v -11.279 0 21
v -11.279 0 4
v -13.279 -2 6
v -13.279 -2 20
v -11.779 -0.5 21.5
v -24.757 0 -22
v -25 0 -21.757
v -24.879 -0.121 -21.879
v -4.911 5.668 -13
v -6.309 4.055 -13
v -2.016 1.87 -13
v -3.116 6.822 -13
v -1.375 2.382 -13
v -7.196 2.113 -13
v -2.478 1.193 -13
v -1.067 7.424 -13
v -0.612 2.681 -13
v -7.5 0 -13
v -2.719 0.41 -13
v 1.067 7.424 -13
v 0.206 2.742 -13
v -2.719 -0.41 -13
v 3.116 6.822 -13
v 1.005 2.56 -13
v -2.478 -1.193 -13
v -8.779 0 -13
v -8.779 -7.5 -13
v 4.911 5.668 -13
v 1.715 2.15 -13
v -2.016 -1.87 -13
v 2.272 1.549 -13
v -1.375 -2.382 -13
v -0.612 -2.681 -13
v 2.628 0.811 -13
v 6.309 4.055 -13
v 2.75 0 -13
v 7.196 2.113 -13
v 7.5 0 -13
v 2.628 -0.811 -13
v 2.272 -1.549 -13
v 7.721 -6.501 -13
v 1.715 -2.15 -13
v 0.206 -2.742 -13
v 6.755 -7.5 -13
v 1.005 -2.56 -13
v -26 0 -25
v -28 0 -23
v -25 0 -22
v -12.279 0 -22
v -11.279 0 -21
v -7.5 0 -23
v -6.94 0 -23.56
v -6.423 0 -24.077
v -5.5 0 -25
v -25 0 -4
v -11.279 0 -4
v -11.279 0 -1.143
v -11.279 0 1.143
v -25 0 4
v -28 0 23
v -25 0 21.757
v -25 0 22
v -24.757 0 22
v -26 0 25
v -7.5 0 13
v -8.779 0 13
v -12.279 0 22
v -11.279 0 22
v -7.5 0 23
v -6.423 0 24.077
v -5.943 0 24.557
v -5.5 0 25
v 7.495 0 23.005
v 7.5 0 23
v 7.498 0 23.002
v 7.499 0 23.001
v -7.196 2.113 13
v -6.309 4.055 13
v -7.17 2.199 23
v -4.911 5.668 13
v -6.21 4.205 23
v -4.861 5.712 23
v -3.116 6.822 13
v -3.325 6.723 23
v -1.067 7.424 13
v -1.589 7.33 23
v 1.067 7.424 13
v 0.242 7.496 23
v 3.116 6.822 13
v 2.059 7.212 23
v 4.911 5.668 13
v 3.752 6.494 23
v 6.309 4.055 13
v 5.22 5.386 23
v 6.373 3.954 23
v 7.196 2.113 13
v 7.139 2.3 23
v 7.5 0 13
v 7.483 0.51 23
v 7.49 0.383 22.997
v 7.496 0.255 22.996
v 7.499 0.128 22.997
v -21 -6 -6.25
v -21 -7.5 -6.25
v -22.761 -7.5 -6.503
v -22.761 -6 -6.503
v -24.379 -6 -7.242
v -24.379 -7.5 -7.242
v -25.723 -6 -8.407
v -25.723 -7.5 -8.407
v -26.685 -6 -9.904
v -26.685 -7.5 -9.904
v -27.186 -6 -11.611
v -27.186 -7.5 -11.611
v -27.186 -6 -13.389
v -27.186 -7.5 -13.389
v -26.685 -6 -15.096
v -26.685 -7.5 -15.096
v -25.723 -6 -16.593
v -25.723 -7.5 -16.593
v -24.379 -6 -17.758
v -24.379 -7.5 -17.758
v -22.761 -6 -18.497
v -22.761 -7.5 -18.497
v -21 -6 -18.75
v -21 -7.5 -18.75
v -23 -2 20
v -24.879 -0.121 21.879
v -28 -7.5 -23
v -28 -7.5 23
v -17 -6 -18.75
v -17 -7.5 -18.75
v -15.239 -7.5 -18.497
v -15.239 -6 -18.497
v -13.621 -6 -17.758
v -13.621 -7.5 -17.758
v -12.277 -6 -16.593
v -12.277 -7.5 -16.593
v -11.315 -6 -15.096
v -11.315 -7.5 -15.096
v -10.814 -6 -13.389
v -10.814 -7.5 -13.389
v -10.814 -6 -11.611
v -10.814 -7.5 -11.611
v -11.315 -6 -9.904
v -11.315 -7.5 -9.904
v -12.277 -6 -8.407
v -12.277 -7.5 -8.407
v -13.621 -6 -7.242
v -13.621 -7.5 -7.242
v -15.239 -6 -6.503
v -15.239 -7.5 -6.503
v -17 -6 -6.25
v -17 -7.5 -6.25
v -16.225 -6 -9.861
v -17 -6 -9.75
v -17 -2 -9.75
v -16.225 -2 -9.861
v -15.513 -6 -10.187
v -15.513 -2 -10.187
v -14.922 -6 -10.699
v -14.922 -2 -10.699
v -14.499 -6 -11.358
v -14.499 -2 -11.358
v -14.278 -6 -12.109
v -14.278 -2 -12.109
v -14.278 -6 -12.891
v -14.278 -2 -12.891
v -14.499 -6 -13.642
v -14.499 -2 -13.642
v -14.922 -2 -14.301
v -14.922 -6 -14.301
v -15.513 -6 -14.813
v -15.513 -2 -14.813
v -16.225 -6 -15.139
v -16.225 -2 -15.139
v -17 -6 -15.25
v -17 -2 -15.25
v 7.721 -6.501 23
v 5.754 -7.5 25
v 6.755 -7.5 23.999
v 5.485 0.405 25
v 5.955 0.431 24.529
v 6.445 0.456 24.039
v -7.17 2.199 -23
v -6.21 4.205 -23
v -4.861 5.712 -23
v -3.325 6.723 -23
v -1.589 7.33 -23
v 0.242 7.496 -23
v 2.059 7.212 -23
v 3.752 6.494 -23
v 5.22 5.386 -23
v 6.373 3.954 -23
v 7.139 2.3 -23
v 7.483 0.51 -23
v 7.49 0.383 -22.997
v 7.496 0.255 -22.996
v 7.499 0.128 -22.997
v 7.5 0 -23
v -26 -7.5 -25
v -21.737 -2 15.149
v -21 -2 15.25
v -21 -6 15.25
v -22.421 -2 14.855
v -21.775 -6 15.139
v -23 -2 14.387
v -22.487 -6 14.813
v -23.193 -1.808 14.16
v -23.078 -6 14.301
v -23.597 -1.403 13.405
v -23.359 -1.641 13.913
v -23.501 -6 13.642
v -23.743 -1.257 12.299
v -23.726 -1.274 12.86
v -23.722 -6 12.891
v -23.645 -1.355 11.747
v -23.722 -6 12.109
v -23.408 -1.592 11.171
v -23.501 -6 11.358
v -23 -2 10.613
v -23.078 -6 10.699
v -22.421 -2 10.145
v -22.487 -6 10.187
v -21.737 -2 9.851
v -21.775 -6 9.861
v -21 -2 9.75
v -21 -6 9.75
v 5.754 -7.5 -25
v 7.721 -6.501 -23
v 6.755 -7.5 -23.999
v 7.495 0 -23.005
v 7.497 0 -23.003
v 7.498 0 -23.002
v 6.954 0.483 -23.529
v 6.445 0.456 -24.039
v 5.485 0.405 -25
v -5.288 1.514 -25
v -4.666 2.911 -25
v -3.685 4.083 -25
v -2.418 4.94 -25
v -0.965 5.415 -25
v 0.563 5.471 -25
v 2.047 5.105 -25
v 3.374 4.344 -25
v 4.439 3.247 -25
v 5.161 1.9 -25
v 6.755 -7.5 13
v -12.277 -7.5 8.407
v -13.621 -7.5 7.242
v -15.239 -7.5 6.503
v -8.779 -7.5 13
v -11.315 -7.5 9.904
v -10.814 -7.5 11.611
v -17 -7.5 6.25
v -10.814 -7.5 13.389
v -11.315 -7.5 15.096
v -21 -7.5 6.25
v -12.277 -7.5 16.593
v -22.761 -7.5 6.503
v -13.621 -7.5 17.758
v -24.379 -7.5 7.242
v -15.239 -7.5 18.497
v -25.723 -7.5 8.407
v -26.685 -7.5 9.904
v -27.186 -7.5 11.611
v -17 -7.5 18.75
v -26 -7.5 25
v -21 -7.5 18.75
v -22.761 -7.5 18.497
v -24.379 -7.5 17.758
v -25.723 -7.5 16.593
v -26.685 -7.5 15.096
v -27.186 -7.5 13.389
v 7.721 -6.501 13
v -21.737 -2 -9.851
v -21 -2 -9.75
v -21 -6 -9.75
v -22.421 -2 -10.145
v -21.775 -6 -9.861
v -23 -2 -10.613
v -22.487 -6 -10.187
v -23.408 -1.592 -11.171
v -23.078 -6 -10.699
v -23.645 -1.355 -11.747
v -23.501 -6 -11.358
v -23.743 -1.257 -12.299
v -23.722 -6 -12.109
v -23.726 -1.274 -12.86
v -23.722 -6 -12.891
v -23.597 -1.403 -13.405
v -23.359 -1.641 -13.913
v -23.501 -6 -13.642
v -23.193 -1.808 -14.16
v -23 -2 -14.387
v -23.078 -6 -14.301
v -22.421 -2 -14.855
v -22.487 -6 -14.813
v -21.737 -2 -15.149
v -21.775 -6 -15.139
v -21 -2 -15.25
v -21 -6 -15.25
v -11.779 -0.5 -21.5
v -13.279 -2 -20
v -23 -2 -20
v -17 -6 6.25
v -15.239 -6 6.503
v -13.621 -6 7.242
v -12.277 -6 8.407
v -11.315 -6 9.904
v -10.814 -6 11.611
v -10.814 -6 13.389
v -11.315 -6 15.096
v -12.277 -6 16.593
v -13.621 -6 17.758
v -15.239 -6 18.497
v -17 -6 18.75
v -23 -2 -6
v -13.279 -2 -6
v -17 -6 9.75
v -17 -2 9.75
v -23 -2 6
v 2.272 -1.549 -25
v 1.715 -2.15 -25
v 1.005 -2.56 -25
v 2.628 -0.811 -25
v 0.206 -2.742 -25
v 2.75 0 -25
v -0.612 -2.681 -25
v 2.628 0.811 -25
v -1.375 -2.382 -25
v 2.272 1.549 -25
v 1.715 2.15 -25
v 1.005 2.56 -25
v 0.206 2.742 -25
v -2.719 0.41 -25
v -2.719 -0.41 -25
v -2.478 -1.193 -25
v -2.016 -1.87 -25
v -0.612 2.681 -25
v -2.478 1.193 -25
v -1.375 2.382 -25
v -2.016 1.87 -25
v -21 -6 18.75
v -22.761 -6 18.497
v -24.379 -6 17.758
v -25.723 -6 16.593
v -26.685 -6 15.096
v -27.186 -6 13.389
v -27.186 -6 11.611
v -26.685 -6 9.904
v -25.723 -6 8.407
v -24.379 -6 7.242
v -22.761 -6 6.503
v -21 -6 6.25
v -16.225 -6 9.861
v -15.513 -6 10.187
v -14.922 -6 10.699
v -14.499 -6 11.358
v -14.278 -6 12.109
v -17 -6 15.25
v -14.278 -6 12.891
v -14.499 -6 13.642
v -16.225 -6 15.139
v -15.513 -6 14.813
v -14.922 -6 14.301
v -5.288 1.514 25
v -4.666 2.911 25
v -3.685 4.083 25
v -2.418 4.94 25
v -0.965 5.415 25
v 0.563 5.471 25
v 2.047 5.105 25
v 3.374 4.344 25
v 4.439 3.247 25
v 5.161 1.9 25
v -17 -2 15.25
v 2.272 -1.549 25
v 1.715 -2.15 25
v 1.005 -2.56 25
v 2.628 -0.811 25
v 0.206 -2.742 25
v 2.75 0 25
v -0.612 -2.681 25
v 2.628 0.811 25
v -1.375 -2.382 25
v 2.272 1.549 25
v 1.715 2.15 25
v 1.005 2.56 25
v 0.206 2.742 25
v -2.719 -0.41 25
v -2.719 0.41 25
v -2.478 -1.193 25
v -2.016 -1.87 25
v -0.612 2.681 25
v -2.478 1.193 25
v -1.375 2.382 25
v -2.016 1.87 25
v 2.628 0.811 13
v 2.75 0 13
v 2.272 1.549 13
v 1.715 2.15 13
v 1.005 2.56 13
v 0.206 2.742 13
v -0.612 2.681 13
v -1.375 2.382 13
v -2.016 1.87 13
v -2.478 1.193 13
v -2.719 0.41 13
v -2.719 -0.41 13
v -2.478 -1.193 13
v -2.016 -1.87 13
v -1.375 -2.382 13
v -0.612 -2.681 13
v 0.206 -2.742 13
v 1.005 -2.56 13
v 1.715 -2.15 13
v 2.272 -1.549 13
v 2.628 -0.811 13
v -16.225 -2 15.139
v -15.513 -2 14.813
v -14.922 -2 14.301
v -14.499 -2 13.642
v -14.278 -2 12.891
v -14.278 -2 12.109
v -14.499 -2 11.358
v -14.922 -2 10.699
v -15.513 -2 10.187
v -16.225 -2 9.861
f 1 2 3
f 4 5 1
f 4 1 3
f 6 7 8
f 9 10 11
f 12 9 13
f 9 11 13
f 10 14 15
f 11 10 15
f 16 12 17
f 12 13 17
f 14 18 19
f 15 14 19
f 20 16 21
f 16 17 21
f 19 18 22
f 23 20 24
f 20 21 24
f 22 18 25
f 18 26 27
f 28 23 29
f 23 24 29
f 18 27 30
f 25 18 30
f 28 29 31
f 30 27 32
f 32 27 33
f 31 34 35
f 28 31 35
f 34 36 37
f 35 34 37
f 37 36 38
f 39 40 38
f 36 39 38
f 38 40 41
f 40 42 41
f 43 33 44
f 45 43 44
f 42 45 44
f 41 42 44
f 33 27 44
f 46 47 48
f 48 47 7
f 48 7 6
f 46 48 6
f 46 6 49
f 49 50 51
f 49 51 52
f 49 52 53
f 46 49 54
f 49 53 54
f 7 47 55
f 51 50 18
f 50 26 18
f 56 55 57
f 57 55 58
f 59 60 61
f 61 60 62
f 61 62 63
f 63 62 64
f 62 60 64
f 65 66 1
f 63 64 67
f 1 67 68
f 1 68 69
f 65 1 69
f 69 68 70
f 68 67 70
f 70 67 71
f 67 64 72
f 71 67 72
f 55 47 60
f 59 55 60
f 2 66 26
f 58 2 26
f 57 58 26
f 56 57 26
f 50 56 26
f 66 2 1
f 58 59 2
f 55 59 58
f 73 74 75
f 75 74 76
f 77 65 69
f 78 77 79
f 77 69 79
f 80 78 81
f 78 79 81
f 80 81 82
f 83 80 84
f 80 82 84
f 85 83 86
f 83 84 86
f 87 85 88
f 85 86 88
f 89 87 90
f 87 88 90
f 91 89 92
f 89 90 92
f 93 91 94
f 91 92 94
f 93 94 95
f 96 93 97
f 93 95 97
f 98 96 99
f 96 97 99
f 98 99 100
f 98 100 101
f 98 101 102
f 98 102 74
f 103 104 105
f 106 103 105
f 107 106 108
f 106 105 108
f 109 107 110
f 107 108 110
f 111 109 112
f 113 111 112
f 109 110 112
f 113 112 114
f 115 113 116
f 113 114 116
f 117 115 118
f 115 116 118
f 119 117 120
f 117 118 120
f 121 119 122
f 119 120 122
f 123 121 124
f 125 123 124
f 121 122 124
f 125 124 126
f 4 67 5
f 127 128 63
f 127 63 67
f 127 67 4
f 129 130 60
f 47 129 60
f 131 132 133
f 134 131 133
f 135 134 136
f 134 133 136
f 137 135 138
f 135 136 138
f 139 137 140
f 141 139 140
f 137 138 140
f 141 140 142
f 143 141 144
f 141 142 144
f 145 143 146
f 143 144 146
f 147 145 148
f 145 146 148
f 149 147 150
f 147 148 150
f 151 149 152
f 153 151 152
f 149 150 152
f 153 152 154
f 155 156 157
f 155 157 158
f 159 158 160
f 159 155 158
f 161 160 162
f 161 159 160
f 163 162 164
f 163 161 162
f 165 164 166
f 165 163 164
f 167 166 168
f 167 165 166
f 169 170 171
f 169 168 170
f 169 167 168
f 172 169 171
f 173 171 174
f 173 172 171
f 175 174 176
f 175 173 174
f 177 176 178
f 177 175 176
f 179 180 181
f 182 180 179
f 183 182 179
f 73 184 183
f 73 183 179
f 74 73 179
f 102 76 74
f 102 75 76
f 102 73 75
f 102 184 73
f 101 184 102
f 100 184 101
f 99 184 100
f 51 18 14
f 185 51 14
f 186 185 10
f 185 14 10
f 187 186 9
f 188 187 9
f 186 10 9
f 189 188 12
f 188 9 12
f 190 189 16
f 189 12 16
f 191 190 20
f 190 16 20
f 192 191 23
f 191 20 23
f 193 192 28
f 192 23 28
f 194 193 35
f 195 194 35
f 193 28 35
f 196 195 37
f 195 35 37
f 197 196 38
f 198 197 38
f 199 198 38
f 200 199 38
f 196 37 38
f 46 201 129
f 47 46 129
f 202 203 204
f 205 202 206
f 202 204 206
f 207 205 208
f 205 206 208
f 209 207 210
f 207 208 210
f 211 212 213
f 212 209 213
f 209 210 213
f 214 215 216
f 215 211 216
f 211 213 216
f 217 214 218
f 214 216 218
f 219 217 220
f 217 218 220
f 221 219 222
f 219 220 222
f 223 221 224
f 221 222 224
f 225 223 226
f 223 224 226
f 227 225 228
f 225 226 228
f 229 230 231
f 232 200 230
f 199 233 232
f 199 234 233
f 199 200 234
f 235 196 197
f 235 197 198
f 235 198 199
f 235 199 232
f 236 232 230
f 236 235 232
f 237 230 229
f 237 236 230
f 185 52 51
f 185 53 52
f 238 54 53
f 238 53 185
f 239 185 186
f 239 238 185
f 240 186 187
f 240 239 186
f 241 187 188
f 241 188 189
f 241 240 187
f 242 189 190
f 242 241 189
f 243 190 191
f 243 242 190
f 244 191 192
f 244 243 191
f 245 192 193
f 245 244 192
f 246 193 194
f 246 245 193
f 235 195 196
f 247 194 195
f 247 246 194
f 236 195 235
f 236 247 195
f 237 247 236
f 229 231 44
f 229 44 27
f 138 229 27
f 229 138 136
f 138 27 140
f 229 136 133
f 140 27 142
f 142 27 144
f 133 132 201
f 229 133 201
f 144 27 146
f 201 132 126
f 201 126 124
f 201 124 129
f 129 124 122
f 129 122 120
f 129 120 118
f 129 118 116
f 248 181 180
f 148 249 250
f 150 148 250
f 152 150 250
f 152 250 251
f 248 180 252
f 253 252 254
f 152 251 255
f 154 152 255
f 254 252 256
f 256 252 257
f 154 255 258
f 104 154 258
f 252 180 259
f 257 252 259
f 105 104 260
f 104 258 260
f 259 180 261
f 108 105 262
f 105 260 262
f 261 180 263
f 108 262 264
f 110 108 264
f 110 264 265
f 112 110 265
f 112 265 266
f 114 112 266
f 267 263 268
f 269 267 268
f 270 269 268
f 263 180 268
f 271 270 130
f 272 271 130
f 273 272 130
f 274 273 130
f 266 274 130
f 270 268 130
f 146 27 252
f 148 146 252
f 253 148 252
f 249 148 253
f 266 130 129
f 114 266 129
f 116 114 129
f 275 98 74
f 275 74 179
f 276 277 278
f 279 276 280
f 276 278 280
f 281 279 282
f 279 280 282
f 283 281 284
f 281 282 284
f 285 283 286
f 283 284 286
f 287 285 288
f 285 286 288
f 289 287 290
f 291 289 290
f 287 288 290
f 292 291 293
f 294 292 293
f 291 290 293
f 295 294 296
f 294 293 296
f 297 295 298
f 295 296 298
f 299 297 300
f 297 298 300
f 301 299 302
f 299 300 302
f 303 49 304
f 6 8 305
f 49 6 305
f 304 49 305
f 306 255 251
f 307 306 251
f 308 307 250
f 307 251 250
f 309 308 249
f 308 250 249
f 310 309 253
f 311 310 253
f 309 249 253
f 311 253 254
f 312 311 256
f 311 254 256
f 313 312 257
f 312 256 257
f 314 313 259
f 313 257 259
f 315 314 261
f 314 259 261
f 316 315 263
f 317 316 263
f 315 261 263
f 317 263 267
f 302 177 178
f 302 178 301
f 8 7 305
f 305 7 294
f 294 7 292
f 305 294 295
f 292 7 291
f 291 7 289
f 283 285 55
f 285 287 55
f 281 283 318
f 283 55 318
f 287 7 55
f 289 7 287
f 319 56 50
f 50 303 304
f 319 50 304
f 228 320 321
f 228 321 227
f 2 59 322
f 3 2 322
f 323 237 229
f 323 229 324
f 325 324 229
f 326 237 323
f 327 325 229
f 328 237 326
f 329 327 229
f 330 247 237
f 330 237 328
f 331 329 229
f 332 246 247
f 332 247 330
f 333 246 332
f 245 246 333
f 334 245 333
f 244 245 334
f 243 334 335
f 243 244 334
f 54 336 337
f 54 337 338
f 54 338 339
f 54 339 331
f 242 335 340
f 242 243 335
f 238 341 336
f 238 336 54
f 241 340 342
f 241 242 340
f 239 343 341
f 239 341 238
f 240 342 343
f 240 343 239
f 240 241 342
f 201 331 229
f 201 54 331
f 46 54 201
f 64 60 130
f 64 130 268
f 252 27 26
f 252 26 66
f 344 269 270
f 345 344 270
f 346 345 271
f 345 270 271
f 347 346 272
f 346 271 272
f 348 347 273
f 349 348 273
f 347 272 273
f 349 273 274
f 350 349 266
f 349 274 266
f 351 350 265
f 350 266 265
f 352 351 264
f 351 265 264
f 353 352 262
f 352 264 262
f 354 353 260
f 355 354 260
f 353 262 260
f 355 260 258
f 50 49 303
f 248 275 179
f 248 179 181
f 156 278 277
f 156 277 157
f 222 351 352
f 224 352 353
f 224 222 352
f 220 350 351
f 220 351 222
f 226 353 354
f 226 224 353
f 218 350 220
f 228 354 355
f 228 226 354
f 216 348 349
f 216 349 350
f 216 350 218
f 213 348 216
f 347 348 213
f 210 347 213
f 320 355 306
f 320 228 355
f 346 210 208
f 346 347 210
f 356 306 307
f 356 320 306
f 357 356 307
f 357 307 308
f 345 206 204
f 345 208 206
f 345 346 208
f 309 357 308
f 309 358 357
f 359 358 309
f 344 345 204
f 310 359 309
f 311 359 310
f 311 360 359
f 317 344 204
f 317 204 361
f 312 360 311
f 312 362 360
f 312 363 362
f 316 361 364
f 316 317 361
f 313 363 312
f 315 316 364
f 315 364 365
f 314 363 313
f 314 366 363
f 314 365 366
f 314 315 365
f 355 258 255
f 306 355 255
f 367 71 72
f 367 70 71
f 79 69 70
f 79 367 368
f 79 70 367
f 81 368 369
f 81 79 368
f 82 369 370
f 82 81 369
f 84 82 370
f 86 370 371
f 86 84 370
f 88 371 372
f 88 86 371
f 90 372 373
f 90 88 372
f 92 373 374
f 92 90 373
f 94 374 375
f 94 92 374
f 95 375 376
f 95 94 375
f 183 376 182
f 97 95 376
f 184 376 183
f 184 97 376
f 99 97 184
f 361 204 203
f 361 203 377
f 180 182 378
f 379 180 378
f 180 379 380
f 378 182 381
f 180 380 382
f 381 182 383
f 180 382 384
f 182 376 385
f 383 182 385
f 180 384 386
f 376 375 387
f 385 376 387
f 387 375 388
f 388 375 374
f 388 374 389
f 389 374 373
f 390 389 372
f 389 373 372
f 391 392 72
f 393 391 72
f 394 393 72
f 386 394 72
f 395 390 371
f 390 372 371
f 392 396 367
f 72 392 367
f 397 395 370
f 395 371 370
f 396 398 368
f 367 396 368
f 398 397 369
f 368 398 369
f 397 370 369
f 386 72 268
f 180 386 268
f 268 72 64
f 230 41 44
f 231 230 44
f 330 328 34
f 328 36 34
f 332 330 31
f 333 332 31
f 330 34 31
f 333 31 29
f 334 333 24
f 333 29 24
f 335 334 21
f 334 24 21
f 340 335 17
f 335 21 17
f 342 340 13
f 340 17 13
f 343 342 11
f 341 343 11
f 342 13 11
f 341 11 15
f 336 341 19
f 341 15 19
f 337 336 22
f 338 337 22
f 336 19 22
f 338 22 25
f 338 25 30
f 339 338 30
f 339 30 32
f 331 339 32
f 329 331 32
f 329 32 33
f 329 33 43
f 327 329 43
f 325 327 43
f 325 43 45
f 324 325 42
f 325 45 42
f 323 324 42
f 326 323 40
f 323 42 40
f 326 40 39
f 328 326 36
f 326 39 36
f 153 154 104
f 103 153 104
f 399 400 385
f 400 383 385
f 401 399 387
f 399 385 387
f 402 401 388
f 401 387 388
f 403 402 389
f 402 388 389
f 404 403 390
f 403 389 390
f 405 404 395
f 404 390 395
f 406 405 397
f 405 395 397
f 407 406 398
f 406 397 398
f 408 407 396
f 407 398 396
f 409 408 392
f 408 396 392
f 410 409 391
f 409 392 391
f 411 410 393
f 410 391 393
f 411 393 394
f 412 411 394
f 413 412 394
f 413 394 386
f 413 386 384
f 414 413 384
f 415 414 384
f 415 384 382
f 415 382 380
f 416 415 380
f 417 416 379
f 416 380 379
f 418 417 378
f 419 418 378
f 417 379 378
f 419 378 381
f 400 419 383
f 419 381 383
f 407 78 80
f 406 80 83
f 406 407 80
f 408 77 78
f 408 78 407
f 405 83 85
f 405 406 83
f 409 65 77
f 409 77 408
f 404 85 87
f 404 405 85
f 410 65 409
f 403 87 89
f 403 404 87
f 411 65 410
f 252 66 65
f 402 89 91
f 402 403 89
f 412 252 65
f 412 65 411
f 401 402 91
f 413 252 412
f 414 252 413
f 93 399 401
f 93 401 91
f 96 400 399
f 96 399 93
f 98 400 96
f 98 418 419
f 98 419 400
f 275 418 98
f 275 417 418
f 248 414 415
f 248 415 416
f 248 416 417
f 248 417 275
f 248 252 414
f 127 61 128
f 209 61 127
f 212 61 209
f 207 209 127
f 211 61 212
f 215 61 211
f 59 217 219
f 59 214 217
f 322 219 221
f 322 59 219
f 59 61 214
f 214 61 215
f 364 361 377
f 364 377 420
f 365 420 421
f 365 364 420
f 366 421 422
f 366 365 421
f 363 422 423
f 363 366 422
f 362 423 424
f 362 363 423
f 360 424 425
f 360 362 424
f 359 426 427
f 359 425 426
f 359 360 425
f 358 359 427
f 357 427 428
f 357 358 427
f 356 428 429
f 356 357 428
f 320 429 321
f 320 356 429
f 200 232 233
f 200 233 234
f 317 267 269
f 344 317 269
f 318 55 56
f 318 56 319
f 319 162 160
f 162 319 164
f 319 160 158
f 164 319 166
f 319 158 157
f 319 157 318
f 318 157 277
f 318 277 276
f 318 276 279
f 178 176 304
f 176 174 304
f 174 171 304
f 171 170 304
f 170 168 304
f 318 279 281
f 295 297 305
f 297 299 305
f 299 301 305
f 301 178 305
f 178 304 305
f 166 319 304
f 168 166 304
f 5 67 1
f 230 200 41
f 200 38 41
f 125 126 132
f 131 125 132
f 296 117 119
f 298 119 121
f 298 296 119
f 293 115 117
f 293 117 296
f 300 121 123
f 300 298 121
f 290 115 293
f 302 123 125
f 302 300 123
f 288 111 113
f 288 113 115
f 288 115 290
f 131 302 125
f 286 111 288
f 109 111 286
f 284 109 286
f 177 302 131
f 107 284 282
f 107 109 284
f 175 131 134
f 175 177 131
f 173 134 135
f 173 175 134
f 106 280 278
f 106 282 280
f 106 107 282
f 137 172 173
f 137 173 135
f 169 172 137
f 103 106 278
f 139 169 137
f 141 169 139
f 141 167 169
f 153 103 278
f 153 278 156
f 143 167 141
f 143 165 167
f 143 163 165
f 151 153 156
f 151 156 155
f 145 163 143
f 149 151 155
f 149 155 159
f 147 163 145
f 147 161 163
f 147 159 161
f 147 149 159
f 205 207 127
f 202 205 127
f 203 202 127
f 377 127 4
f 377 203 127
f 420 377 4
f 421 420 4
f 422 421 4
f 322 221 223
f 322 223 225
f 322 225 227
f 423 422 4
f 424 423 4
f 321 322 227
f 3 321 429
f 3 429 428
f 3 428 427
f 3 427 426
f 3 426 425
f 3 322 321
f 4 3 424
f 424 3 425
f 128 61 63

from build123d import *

# Parameters (mm, degrees)
BOSS_EXTRUDE1_DEPTH = 25
MOUNT_HOLES_DEPTH   = 41.422765863
SKETCH7_W           = 16.5
SKETCH7_H           = 26
CUT_PART_DEPTH      = 20
AXIS_R              = 2.75
CUT_EXTRUDE3_DEPTH  = 30
CUT_EXTRUDE4_DEPTH  = 1.5
CUT_EXTRUDE5_DEPTH  = 2
CHAMFER2_SIZE       = 2


with BuildPart() as part:
    # contour → Boss-Extrude1 (new, symmetric)
    with BuildSketch(Plane.XY):
        with BuildLine():
            Line((7.5, 0), (7.721344931, -6.500579199))
            Line((7.721344931, -6.500579199), (6.755375242, -7.5))
            Line((6.755375242, -7.5), (0, -7.5))
            Line((0, -7.5), (-28, -7.5))
            Line((-28, -7.5), (-28, -7.827e-05))
            Line((-28, -7.827e-05), (-7.5, -7.827e-05))
            ThreePointArc((-7.5, -7.827e-05), (-3.9135e-05, 7.5), (7.5, 0))
        make_face()
    extrude(amount=BOSS_EXTRUDE1_DEPTH, both=True)

    # Sketch6 → mount-holes (cut, through all)
    with BuildSketch(Plane.XZ.offset(7.5)):
        with BuildLine():
            Line((-21, 15.25), (-17, 15.25))
            ThreePointArc((-17, 15.25), (-14.25, 12.5), (-17, 9.75))
            Line((-17, 9.75), (-21, 9.75))
            ThreePointArc((-21, 9.75), (-23.75, 12.5), (-21, 15.25))
        make_face()
        with BuildLine():
            Line((-21, -9.75), (-17, -9.75))
            ThreePointArc((-17, -9.75), (-14.25, -12.5), (-17, -15.25))
            Line((-17, -15.25), (-21, -15.25))
            ThreePointArc((-21, -15.25), (-23.75, -12.5), (-21, -9.75))
        make_face()
    extrude(amount=-MOUNT_HOLES_DEPTH, mode=Mode.SUBTRACT)

    # Sketch7 → cut-part (cut)
    with BuildSketch(Plane.XZ.offset(7.5)):
        with Locations((-0.528655069, 0)):
            Rectangle(SKETCH7_W, SKETCH7_H)
    extrude(amount=-CUT_PART_DEPTH, mode=Mode.SUBTRACT)

    # axis → Cut-Extrude3 (cut, symmetric)
    with BuildSketch(Plane.XY):
        Circle(AXIS_R)
    extrude(amount=CUT_EXTRUDE3_DEPTH, both=True, mode=Mode.SUBTRACT)

    # Sketch9 → Cut-Extrude4 (cut)
    with BuildSketch(Plane.XZ.offset(7.5)):
        with BuildLine():
            Line((-17, 18.75), (-21, 18.75))
            ThreePointArc((-21, 18.75), (-27.25, 12.5), (-21, 6.25))
            Line((-21, 6.25), (-17, 6.25))
            ThreePointArc((-17, 6.25), (-10.75, 12.5), (-17, 18.75))
        make_face()
        with BuildLine():
            Line((-21, -18.75), (-17, -18.75))
            ThreePointArc((-17, -18.75), (-10.75, -12.5), (-17, -6.25))
            Line((-17, -6.25), (-21, -6.25))
            ThreePointArc((-21, -6.25), (-27.25, -12.5), (-21, -18.75))
        make_face()
    extrude(amount=-CUT_EXTRUDE4_DEPTH, mode=Mode.SUBTRACT)

    # Chamfer1
    # the kernel refuses this chamfer: 2 mm, written as the material it takes off along each edge
    with BuildSketch(Plane(origin=(7.324969659, 5.140386945, -25), x_dir=(0.027479951033163995, 0.0009356932186842305, 0.9996219169112968), z_dir=(0.03403031050568426, -0.9994208012478462, 0))) as chamfer1_piece_1_section:
        with BuildLine():
            Line((2.05734639, 0), (-0.11309431, 2.054235587))
            Line((-0.11309431, 2.054235587), (-0.153079186, 2.053135752))
            ThreePointArc((-0.153079186, 2.053135752), (-0.068258454, 1.026795659), (-0.039984877, -0.001099835))
            Line((-0.039984877, -0.001099835), (0.001099835, -0.039984877))
            ThreePointArc((0.001099835, -0.039984877), (1.028995329, -0.011711299), (2.058446225, -0.039984877))
            Line((2.058446225, -0.039984877), (2.05734639, 0))
        make_face()
    chamfer1_piece_1 = extrude(amount=16.79107846, mode=Mode.PRIVATE)
    chamfer1_piece_1 = split(chamfer1_piece_1, bisect_by=Plane(origin=(7.719880972, -6.502093854, -23.313005801), z_dir=(-0.7190376591339585, 0.6949711107284657, 0)), keep=Keep.TOP, mode=Mode.PRIVATE)
    add(chamfer1_piece_1, mode=Mode.SUBTRACT)
    with BuildSketch(Plane(origin=(7.324969659, 5.140386945, 25), x_dir=(-0.9990429371443961, -0.03401744422077874, 0.027495876610585647), z_dir=(0.03403031050568426, -0.9994208012478462, 0))) as chamfer1_piece_2_section:
        with BuildLine():
            Line((2.05734639, 0), (-0.11309431, 2.054235587))
            Line((-0.11309431, 2.054235587), (-0.153079186, 2.053135752))
            ThreePointArc((-0.153079186, 2.053135752), (-0.068258454, 1.026795659), (-0.039984877, -0.001099835))
            Line((-0.039984877, -0.001099835), (0.001099835, -0.039984877))
            ThreePointArc((0.001099835, -0.039984877), (1.028995329, -0.011711299), (2.058446225, -0.039984877))
            Line((2.058446225, -0.039984877), (2.05734639, 0))
        make_face()
    chamfer1_piece_2 = extrude(amount=16.79107846, mode=Mode.PRIVATE)
    chamfer1_piece_2 = split(chamfer1_piece_2, bisect_by=Plane(origin=(10.54505629, -3.579083939, 24.461957422), z_dir=(-0.7190376591339585, 0.6949711107284657, 0)), keep=Keep.TOP, mode=Mode.PRIVATE)
    add(chamfer1_piece_2, mode=Mode.SUBTRACT)
    with BuildSketch(Plane(origin=(-28, -7.5, -25), x_dir=(0.9996219169112968, 0, -0.027495876610585647), z_dir=(0, 1, 0)), Plane(origin=(-28, -7.5, 25), x_dir=(-0.027495876610585647, 0, -0.9996219169112968), z_dir=(0, 1, 0))) as chamfer1_piece_3:
        with BuildLine():
            Line((2.05734639, 0), (-0.11309431, -2.054235587))
            Line((-0.11309431, -2.054235587), (-0.153079186, -2.053135752))
            ThreePointArc((-0.153079186, -2.053135752), (-0.068258454, -1.026795659), (-0.039984877, 0.001099835))
            Line((-0.039984877, 0.001099835), (0.001099835, 0.039984877))
            ThreePointArc((0.001099835, 0.039984877), (1.028995329, 0.011711299), (2.058446225, 0.039984877))
            Line((2.058446225, 0.039984877), (2.05734639, 0))
        make_face()
    extrude(amount=7.49992173, mode=Mode.SUBTRACT)
    with BuildSketch(Plane(origin=(0, 0, -25), x_dir=(-0.7732184624570568, -0.6341397395807529, 0), z_dir=(0.6341397395807529, -0.7732184624570568, 0))) as chamfer1_piece_4_section:
        with BuildLine():
            Line((7.556568542, -2.056568542), (5.443431458, 0.056568542))
            Line((5.443431458, 0.056568542), (5.443431458, 0.096568542))
            ThreePointArc((5.443431458, 0.096568542), (6.471715729, 0.04), (7.5, 0.04))
            Line((7.5, 0.04), (7.54, 0))
            ThreePointArc((7.54, 0), (7.54, -1.028284271), (7.596568542, -2.056568542))
            Line((7.596568542, -2.056568542), (7.556568542, -2.056568542))
        make_face()
    chamfer1_piece_4 = revolve(axis=Axis((0, 0, -25), (0, 0, -1)), revolution_arc=258.711821509, mode=Mode.PRIVATE)
    chamfer1_piece_4 = split(chamfer1_piece_4, bisect_by=Plane(origin=(0, -7.827e-05, -24.025554596), z_dir=(0, 1, 0)), keep=Keep.TOP, mode=Mode.PRIVATE)
    chamfer1_piece_4 = split(chamfer1_piece_4, bisect_by=Plane(origin=(7.269376506, 6.773077101, -24.025554596), z_dir=(-0.9994208012478462, -0.03403031050568426, 0)), keep=Keep.TOP, mode=Mode.PRIVATE)
    add(chamfer1_piece_4, mode=Mode.SUBTRACT)
    with BuildSketch(Plane(origin=(0, 0, 25), x_dir=(-0.7732184624570568, -0.6341397395807529, 0), z_dir=(0.6341397395807529, -0.7732184624570568, 0))) as chamfer1_piece_5_section:
        with BuildLine():
            Line((5.443431458, -0.056568542), (7.556568542, 2.056568542))
            Line((7.556568542, 2.056568542), (7.596568542, 2.056568542))
            ThreePointArc((7.596568542, 2.056568542), (7.54, 1.028284271), (7.54, 0))
            Line((7.54, 0), (7.5, -0.04))
            ThreePointArc((7.5, -0.04), (6.471715729, -0.04), (5.443431458, -0.096568542))
            Line((5.443431458, -0.096568542), (5.443431458, -0.056568542))
        make_face()
    chamfer1_piece_5 = revolve(axis=Axis((0, 0, 25), (0, 0, -1)), revolution_arc=258.711821509, mode=Mode.PRIVATE)
    chamfer1_piece_5 = split(chamfer1_piece_5, bisect_by=Plane(origin=(0, -7.827e-05, 24.025554599), z_dir=(0, 1, 0)), keep=Keep.TOP, mode=Mode.PRIVATE)
    chamfer1_piece_5 = split(chamfer1_piece_5, bisect_by=Plane(origin=(7.269376506, 6.773077103, 24.025554599), z_dir=(-0.9994208012478462, -0.03403031050568426, 0)), keep=Keep.TOP, mode=Mode.PRIVATE)
    add(chamfer1_piece_5, mode=Mode.SUBTRACT)

    # Sketch10 → Cut-Extrude5 (cut)
    with BuildSketch(Plane(origin=(0, -7.827e-05, 0), x_dir=(1, 0, 0), z_dir=(0, 1, 0))):
        Polygon((-11.278655069, 4), (-25, 4), (-25, 21.757359313), (-24.757359313, 22), (-12.278655069, 22), (-11.278655069, 21), align=None)
        Polygon((-11.278655069, -4), (-25, -4), (-25, -21.757359313), (-24.757359313, -22), (-12.278655069, -22), (-11.278655069, -21), align=None)
    extrude(amount=-CUT_EXTRUDE5_DEPTH, mode=Mode.SUBTRACT)

    # Chamfer2
    # the kernel refuses this chamfer: 2 mm, written as the material it adds along each edge
    with BuildSketch(Plane(origin=(-29.900725289, -2.00007827, 22), x_dir=(0, 0.9996219169112968, 0.02749587661058563), z_dir=(1, 0, 0))) as chamfer2_piece_1_section:
        Polygon((CHAMFER2_SIZE * 0.999621916911, -CHAMFER2_SIZE * 0.0274958766106), (-CHAMFER2_SIZE * 0.0274958766106, -CHAMFER2_SIZE * 0.999621916911), (0, 0), align=None)
    chamfer2_piece_1 = extrude(amount=22.765436196, mode=Mode.PRIVATE)
    chamfer2_piece_1 = split(chamfer2_piece_1, bisect_by=Plane(origin=(-25, -1.339790295, 21.320575951), z_dir=(1, 0, 0)), keep=Keep.TOP, mode=Mode.PRIVATE)
    add(chamfer2_piece_1)
    with BuildSketch(Plane(origin=(-25, -2.00007827, 1.143365976), x_dir=(-0.02749587661058563, 0.9996219169112968, 0), z_dir=(0, 0, -1))) as chamfer2_piece_2_section:
        Polygon((CHAMFER2_SIZE * 0.999621916911, CHAMFER2_SIZE * 0.0274958766106), (-CHAMFER2_SIZE * 0.0274958766106, CHAMFER2_SIZE * 0.999621916911), (0, 0), align=None)
    chamfer2_piece_2 = extrude(amount=28.044091265, mode=Mode.PRIVATE)
    chamfer2_piece_2 = split(chamfer2_piece_2, bisect_by=Plane(origin=(-24.347473985, -1.326341277, -22), z_dir=(0, 0, 1)), keep=Keep.TOP, mode=Mode.PRIVATE)
    chamfer2_piece_2 = chamfer2_piece_2 - Plane(origin=(-21, -1.326341277, -12.5), x_dir=(0, 0, -1), z_dir=(0, -1, 0)) * Cylinder(2.75, 65, mode=Mode.PRIVATE)
    add(chamfer2_piece_2)
    with BuildSketch(Plane(origin=(-29.900725289, -2.00007827, -22), x_dir=(1.7831818563715163e-15, 0.9996219169112968, -0.02749587661058563), z_dir=(1, 0, 0))) as chamfer2_piece_3_section:
        Polygon((CHAMFER2_SIZE * 0.999621916911, CHAMFER2_SIZE * 0.0274958766106), (-CHAMFER2_SIZE * 0.0274958766106, CHAMFER2_SIZE * 0.999621916911), (0, 0), align=None)
    chamfer2_piece_3 = extrude(amount=22.765436196, mode=Mode.PRIVATE)
    chamfer2_piece_3 = split(chamfer2_piece_3, bisect_by=Plane(origin=(-21.883009307, -1.339790295, -24.874350006), z_dir=(0.7071067811864957, 0, 0.7071067811865993)), keep=Keep.TOP, mode=Mode.PRIVATE)
    add(chamfer2_piece_3)
    with BuildSketch(Plane(origin=(-11.278655069, -2.00007827, -26.143365976), x_dir=(0.027495876610586494, 0.9996219169112968, 0), z_dir=(0, 0, 1))) as chamfer2_piece_4_section:
        Polygon((CHAMFER2_SIZE * 0.999621916911, CHAMFER2_SIZE * 0.0274958766106), (-CHAMFER2_SIZE * 0.0274958766106, CHAMFER2_SIZE * 0.999621916911), (0, 0), align=None)
    chamfer2_piece_4 = extrude(amount=27.286731952, mode=Mode.PRIVATE)
    chamfer2_piece_4 = split(chamfer2_piece_4, bisect_by=Plane(origin=(-7.513844642, -1.337755995, -17.235189573), z_dir=(-0.707106781186572, 0, 0.707106781186523)), keep=Keep.TOP, mode=Mode.PRIVATE)
    add(chamfer2_piece_4)
    with BuildSketch(Plane(origin=(-11.278655069, -2.00007827, -4), x_dir=(0, 0.9996219169112968, 0.027495876610586275), z_dir=(-1, 0, 0))) as chamfer2_piece_5:
        Polygon((CHAMFER2_SIZE * 0.999621916911, CHAMFER2_SIZE * 0.0274958766106), (-CHAMFER2_SIZE * 0.0274958766106, CHAMFER2_SIZE * 0.999621916911), (0, 0), align=None)
    extrude(amount=13.721344931)
    with BuildSketch(Plane(origin=(-25, -2.00007827, -1.143365976), x_dir=(-0.02749587661058563, 0.9996219169112968, 0), z_dir=(0, 0, 1))) as chamfer2_piece_6_section:
        Polygon((CHAMFER2_SIZE * 0.999621916911, -CHAMFER2_SIZE * 0.0274958766106), (-CHAMFER2_SIZE * 0.0274958766106, -CHAMFER2_SIZE * 0.999621916911), (0, 0), align=None)
    chamfer2_piece_6 = extrude(amount=28.044091265, mode=Mode.PRIVATE)
    chamfer2_piece_6 = split(chamfer2_piece_6, bisect_by=Plane(origin=(-29.055362029, -1.326341277, 17.701997284), z_dir=(0.7071067811865476, 0, -0.7071067811865476)), keep=Keep.TOP, mode=Mode.PRIVATE)
    chamfer2_piece_6 = chamfer2_piece_6 - Plane(origin=(-21, -1.326341277, 12.5), x_dir=(0, 0, -1), z_dir=(0, -1, 0)) * Cylinder(2.75, 65, mode=Mode.PRIVATE)
    add(chamfer2_piece_6)
    with BuildSketch(Plane(origin=(-11.278655069, -2.00007827, 4), x_dir=(0, 0.9996219169112968, -0.027495876610586275), z_dir=(-1, 0, 0))) as chamfer2_piece_7:
        Polygon((CHAMFER2_SIZE * 0.999621916911, -CHAMFER2_SIZE * 0.0274958766106), (-CHAMFER2_SIZE * 0.0274958766106, -CHAMFER2_SIZE * 0.999621916911), (0, 0), align=None)
    extrude(amount=13.721344931)
    with BuildSketch(Plane(origin=(-11.278655069, -2.00007827, 26.143365976), x_dir=(0.027495876610586494, 0.9996219169112968, 0), z_dir=(0, 0, -1))) as chamfer2_piece_8_section:
        Polygon((CHAMFER2_SIZE * 0.999621916911, -CHAMFER2_SIZE * 0.0274958766106), (-CHAMFER2_SIZE * 0.0274958766106, -CHAMFER2_SIZE * 0.999621916911), (0, 0), align=None)
    chamfer2_piece_8 = extrude(amount=27.286731952, mode=Mode.PRIVATE)
    chamfer2_piece_8 = split(chamfer2_piece_8, bisect_by=Plane(origin=(-11.954010519, -1.337755995, 22), z_dir=(0, 0, -1)), keep=Keep.TOP, mode=Mode.PRIVATE)
    add(chamfer2_piece_8)


solid = part.part
